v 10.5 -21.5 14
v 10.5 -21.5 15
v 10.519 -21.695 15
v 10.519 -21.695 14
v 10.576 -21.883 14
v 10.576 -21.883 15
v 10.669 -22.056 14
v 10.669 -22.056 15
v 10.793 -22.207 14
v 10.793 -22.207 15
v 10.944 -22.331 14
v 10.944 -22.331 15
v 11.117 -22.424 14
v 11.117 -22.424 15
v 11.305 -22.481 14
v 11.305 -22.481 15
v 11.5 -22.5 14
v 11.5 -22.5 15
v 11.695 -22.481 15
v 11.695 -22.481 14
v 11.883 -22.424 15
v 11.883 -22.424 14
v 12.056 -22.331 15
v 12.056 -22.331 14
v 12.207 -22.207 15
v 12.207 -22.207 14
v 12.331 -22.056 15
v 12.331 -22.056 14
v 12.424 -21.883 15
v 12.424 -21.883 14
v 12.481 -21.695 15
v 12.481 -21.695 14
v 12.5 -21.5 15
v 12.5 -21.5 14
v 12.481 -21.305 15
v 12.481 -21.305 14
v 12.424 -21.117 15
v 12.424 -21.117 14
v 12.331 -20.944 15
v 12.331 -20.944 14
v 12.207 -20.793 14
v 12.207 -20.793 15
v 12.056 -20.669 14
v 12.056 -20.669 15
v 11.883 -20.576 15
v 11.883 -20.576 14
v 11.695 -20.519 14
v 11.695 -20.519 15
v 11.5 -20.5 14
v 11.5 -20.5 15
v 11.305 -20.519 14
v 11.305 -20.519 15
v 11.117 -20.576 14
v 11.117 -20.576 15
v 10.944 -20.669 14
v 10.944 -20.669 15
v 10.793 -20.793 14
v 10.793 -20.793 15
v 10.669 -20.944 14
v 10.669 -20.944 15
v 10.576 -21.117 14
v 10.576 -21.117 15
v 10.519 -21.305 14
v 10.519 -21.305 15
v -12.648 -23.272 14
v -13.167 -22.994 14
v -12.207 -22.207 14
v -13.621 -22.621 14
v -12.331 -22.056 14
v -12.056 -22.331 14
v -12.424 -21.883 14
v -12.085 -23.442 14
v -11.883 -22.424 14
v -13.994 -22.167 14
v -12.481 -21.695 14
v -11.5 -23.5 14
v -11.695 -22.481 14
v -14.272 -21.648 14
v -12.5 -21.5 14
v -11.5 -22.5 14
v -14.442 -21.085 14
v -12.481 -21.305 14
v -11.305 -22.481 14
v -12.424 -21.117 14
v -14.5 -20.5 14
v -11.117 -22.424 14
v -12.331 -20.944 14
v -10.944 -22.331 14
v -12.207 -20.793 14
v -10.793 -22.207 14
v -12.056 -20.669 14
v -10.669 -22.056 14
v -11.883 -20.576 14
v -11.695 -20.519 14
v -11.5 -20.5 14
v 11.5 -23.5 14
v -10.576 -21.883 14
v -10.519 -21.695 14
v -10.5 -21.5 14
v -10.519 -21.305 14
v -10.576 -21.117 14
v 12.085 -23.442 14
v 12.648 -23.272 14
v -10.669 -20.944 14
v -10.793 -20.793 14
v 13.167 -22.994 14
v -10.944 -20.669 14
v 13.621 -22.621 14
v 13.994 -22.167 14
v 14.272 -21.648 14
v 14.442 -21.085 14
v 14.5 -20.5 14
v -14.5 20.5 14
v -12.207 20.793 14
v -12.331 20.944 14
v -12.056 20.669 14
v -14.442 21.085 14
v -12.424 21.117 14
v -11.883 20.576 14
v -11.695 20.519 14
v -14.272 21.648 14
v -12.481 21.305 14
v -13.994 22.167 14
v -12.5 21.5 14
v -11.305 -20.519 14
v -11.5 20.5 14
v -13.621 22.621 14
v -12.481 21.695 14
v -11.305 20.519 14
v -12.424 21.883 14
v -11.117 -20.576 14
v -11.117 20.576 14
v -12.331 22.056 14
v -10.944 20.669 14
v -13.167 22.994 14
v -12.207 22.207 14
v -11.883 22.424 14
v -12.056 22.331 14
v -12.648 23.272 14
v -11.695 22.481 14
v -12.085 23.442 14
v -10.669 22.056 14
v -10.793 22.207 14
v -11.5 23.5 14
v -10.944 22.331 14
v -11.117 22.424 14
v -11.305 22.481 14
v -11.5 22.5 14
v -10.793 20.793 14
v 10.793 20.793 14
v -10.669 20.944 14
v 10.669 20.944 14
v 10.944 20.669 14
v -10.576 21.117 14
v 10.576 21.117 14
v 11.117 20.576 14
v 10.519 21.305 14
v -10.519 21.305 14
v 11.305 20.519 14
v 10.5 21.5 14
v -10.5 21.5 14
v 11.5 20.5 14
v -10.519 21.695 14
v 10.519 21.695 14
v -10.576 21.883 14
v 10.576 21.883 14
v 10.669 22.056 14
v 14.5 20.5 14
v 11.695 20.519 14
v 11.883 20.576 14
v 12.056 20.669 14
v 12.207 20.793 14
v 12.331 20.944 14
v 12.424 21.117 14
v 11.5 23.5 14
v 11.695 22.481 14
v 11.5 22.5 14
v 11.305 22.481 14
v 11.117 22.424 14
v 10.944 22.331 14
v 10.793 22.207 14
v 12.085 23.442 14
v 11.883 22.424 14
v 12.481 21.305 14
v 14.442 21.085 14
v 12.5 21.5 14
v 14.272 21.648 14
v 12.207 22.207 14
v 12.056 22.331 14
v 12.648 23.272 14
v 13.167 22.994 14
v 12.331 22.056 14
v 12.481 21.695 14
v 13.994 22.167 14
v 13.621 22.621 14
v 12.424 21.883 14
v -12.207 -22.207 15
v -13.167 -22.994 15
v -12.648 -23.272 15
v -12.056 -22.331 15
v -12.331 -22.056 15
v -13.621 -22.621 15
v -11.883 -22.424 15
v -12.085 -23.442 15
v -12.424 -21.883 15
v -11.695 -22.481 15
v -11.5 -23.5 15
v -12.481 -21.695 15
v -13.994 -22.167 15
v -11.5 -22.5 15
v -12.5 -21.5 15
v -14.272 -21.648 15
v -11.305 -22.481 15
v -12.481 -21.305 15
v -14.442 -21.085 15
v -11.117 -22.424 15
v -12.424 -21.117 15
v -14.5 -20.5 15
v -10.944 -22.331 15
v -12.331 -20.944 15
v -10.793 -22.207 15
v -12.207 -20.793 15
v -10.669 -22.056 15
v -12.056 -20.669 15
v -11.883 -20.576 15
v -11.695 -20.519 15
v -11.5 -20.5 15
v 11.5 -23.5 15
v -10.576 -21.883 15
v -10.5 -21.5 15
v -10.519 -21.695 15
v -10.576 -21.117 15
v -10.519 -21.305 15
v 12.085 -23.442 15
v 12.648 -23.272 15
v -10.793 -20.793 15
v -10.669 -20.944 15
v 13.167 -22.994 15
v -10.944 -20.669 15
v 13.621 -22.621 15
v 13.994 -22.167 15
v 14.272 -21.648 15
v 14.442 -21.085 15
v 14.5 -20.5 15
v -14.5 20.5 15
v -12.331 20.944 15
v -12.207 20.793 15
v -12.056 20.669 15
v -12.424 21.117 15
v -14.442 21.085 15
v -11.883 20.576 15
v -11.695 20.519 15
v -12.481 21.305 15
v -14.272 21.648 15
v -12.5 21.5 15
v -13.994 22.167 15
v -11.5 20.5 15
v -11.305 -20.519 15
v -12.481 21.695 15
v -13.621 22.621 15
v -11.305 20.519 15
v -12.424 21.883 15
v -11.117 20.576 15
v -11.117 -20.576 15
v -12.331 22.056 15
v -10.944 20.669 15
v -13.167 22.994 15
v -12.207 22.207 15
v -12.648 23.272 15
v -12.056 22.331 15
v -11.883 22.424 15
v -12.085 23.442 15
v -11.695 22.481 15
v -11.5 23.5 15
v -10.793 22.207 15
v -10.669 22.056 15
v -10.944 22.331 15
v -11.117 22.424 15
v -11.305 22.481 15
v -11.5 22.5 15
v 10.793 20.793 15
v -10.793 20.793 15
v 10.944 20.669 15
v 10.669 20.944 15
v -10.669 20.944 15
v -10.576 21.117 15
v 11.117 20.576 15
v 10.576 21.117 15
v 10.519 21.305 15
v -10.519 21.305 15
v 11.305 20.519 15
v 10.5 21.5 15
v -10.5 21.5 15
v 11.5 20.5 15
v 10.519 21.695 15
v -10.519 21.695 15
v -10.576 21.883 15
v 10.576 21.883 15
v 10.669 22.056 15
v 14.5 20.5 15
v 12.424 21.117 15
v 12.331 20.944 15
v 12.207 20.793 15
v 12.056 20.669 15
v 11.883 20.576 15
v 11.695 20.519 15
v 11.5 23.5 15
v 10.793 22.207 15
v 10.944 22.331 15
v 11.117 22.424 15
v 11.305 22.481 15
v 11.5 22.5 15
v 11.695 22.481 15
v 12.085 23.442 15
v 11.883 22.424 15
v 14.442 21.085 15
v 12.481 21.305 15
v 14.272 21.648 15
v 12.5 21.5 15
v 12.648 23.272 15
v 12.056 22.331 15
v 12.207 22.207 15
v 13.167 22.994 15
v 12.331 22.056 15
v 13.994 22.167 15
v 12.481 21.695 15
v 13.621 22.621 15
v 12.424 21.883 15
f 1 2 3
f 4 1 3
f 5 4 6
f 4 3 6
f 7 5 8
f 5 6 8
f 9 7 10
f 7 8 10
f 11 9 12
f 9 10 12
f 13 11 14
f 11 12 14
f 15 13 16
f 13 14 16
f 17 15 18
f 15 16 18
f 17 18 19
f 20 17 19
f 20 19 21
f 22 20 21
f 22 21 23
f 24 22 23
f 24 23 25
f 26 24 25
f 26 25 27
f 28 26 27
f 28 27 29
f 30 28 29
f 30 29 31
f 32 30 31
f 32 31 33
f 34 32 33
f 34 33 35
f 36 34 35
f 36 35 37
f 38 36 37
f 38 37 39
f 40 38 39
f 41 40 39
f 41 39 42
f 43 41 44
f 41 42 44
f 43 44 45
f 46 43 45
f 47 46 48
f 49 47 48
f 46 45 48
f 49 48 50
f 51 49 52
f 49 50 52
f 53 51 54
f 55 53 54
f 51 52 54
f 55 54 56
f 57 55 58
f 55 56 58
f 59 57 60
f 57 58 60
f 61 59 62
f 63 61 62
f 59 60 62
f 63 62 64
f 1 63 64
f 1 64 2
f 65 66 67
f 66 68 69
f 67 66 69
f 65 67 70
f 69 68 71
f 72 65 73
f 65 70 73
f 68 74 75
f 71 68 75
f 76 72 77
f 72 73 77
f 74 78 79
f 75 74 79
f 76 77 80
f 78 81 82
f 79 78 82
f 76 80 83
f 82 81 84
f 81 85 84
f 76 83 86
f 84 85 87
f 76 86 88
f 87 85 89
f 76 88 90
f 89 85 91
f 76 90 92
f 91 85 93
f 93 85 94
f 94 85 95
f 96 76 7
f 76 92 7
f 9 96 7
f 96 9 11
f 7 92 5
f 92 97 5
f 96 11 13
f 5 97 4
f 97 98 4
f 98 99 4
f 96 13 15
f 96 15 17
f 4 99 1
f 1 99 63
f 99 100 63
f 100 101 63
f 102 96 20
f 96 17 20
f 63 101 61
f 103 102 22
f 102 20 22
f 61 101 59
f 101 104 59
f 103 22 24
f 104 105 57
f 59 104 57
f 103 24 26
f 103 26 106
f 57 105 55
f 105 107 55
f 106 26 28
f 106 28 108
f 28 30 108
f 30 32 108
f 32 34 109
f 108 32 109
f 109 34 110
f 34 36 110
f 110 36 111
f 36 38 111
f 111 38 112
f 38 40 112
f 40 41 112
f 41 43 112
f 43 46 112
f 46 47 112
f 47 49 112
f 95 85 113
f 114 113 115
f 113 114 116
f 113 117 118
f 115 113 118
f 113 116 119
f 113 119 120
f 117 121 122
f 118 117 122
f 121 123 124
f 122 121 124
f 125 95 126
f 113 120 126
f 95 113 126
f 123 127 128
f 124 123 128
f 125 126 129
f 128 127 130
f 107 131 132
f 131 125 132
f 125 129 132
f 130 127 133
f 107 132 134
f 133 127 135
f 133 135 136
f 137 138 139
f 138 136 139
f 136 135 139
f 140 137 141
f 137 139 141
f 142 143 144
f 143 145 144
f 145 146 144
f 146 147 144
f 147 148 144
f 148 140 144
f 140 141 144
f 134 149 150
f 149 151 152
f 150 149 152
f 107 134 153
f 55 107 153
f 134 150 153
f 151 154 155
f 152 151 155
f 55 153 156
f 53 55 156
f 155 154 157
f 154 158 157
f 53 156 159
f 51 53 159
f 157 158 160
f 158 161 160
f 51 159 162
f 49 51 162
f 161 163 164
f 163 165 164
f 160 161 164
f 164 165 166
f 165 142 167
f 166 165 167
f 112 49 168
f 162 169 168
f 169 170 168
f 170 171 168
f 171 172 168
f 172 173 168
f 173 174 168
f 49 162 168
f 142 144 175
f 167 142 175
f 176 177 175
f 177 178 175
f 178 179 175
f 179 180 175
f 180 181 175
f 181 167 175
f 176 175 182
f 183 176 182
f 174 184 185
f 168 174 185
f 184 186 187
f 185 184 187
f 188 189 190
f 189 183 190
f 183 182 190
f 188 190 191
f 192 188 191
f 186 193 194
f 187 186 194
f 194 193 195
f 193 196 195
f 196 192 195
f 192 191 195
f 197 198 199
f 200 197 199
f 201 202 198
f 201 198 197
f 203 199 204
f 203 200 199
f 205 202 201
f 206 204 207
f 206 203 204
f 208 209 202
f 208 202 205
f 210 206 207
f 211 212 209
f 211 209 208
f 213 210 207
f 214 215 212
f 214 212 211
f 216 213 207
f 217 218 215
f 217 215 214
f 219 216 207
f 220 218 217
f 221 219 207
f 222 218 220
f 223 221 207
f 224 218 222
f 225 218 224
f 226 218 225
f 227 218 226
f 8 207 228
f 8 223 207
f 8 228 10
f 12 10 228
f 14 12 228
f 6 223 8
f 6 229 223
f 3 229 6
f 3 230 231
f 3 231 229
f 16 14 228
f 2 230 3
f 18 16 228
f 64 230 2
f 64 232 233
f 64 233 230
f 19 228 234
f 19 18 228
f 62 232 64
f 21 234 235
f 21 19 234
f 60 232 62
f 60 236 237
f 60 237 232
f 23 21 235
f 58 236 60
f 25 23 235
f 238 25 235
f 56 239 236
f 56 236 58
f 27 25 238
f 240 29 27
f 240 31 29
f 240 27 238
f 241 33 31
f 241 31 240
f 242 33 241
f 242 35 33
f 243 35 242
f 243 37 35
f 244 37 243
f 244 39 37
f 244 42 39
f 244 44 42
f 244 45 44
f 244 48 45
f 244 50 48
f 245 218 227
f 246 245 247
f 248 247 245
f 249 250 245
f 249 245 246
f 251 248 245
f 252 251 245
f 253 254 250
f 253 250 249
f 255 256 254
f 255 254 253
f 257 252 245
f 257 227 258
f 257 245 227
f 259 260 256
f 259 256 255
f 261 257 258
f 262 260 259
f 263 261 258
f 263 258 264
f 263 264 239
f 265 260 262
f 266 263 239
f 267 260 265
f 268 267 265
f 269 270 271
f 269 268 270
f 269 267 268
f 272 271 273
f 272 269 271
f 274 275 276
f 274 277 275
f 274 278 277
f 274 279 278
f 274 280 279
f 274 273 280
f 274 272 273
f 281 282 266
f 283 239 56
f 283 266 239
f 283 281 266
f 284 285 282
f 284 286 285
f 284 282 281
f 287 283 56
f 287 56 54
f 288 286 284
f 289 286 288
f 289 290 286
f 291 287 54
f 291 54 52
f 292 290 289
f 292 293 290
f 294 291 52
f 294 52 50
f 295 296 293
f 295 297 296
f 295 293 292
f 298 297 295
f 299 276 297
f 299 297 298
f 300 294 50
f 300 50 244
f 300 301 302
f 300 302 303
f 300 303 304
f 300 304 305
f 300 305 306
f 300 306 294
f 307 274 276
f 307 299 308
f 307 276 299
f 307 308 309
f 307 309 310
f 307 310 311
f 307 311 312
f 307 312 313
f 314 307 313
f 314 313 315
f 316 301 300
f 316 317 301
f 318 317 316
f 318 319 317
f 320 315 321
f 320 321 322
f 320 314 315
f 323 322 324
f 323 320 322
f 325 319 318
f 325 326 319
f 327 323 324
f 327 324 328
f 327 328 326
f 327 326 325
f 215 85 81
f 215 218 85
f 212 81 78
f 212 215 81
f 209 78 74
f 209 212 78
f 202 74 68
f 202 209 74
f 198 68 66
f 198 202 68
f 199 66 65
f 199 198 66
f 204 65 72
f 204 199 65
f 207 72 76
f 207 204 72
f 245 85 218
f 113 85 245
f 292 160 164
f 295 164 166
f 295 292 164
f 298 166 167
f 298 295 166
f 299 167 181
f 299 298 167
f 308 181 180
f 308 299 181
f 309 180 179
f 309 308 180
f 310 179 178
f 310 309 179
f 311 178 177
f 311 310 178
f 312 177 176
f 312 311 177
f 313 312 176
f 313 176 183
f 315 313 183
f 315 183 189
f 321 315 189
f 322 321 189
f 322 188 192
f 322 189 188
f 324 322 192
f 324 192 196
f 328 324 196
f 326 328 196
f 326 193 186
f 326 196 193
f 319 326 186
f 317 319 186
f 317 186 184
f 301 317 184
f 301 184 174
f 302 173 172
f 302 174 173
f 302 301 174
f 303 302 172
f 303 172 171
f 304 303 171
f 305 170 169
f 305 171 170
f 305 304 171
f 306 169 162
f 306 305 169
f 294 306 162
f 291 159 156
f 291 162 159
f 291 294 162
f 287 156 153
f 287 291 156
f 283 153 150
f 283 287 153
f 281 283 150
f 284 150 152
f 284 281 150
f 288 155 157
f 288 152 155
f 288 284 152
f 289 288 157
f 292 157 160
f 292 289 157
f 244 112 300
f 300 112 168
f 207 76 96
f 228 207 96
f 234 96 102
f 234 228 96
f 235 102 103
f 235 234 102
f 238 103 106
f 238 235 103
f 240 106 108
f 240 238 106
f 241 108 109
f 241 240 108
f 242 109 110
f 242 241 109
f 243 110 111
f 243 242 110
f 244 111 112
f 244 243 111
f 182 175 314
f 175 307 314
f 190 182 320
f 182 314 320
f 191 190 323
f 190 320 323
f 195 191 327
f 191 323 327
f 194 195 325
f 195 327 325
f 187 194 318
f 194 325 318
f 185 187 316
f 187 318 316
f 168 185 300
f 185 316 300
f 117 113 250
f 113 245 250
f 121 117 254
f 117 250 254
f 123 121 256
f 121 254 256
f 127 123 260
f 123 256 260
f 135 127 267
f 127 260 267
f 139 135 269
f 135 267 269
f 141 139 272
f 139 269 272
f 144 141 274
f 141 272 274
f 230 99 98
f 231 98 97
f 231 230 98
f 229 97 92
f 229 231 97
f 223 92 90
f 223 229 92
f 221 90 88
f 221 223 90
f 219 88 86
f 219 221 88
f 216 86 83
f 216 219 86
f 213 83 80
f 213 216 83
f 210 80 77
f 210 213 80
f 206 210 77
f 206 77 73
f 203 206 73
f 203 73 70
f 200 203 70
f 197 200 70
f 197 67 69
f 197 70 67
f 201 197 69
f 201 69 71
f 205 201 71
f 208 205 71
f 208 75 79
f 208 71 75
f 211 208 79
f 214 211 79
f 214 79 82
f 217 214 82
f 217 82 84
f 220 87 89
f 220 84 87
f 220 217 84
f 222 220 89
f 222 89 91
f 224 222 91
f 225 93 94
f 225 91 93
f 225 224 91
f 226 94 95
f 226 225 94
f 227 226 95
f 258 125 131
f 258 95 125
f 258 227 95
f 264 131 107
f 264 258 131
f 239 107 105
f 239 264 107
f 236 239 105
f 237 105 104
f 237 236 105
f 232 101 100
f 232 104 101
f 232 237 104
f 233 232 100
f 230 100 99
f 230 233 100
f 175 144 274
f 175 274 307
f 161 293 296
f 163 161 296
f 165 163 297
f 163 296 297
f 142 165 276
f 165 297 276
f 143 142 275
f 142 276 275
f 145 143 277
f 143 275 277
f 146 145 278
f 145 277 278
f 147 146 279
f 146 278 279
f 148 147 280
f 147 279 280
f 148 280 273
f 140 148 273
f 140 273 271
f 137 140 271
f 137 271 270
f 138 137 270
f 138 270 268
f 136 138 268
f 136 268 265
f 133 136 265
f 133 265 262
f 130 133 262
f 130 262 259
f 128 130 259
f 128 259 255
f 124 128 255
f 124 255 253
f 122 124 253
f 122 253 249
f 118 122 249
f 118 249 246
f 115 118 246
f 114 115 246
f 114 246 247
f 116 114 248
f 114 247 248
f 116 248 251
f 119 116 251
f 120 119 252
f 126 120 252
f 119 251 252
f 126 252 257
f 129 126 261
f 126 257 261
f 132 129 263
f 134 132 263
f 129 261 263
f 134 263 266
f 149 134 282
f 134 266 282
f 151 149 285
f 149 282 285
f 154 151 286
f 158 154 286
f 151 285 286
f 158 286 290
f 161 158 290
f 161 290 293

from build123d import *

# Parameters (mm, degrees)
SKETCH005_W                = 29
SKETCH005_H                = 47
PAD001_DEPTH               = 1
SKETCH006_R                = 1
POCKET003_DEPTH            = 111.472716
SKETCH006_MIRRORED_2_R     = 1
POCKET003_MIRRORED_2_DEPTH = 111.472716
FILLET002_R                = 3


with BuildPart() as part:
    # Sketch005 → Pad001 (new body)
    with BuildSketch(Plane.XY):
        Rectangle(SKETCH005_W, SKETCH005_H)
    extrude(amount=PAD001_DEPTH)

    # Sketch006 (on Face6 of Pad001) → Pocket003 (cut, through all)
    with BuildSketch(Plane.XY.offset(1)):
        with Locations((-11.5, 21.5)):
            Circle(SKETCH006_R)
    pocket003 = extrude(amount=-POCKET003_DEPTH, mode=Mode.SUBTRACT)

    # Sketch006 Mirrored 2 → Pocket003 Mirrored 2 (cut, through all)
    with BuildSketch(Plane(origin=(0, 0, 1), x_dir=(-1, 0, 0), z_dir=(0, 0, -1))):
        with Locations((-11.5, 21.5)):
            Circle(SKETCH006_MIRRORED_2_R)
    pocket003_mirrored_2 = extrude(amount=POCKET003_MIRRORED_2_DEPTH, mode=Mode.SUBTRACT)

    # Mirrored001: Pocket003, Pocket003 Mirrored 2 across Sketch006 H_Axis
    add(pocket003.mirror(Plane(origin=(0, 0, 1), x_dir=(0, 0, 1), z_dir=(0, 1, 0))), mode=Mode.SUBTRACT)
    add(pocket003_mirrored_2.mirror(Plane(origin=(0, 0, 1), x_dir=(0, 0, 1), z_dir=(0, 1, 0))), mode=Mode.SUBTRACT)

    # Fillet002
    fillet002_edges = [part.edges().sort_by_distance(p)[0] for p in [
        (-14.5, -23.5, 0.5),
        (14.5, -23.5, 0.5),
        (-14.5, 23.5, 0.5),
        (14.5, 23.5, 0.5),
    ]]
    fillet(fillet002_edges, radius=FILLET002_R)


with BuildPart() as part_1:
    # Body001 placement: moved
    add(part.part.moved(Location((0, 0, 14))))


solid = part_1.part
